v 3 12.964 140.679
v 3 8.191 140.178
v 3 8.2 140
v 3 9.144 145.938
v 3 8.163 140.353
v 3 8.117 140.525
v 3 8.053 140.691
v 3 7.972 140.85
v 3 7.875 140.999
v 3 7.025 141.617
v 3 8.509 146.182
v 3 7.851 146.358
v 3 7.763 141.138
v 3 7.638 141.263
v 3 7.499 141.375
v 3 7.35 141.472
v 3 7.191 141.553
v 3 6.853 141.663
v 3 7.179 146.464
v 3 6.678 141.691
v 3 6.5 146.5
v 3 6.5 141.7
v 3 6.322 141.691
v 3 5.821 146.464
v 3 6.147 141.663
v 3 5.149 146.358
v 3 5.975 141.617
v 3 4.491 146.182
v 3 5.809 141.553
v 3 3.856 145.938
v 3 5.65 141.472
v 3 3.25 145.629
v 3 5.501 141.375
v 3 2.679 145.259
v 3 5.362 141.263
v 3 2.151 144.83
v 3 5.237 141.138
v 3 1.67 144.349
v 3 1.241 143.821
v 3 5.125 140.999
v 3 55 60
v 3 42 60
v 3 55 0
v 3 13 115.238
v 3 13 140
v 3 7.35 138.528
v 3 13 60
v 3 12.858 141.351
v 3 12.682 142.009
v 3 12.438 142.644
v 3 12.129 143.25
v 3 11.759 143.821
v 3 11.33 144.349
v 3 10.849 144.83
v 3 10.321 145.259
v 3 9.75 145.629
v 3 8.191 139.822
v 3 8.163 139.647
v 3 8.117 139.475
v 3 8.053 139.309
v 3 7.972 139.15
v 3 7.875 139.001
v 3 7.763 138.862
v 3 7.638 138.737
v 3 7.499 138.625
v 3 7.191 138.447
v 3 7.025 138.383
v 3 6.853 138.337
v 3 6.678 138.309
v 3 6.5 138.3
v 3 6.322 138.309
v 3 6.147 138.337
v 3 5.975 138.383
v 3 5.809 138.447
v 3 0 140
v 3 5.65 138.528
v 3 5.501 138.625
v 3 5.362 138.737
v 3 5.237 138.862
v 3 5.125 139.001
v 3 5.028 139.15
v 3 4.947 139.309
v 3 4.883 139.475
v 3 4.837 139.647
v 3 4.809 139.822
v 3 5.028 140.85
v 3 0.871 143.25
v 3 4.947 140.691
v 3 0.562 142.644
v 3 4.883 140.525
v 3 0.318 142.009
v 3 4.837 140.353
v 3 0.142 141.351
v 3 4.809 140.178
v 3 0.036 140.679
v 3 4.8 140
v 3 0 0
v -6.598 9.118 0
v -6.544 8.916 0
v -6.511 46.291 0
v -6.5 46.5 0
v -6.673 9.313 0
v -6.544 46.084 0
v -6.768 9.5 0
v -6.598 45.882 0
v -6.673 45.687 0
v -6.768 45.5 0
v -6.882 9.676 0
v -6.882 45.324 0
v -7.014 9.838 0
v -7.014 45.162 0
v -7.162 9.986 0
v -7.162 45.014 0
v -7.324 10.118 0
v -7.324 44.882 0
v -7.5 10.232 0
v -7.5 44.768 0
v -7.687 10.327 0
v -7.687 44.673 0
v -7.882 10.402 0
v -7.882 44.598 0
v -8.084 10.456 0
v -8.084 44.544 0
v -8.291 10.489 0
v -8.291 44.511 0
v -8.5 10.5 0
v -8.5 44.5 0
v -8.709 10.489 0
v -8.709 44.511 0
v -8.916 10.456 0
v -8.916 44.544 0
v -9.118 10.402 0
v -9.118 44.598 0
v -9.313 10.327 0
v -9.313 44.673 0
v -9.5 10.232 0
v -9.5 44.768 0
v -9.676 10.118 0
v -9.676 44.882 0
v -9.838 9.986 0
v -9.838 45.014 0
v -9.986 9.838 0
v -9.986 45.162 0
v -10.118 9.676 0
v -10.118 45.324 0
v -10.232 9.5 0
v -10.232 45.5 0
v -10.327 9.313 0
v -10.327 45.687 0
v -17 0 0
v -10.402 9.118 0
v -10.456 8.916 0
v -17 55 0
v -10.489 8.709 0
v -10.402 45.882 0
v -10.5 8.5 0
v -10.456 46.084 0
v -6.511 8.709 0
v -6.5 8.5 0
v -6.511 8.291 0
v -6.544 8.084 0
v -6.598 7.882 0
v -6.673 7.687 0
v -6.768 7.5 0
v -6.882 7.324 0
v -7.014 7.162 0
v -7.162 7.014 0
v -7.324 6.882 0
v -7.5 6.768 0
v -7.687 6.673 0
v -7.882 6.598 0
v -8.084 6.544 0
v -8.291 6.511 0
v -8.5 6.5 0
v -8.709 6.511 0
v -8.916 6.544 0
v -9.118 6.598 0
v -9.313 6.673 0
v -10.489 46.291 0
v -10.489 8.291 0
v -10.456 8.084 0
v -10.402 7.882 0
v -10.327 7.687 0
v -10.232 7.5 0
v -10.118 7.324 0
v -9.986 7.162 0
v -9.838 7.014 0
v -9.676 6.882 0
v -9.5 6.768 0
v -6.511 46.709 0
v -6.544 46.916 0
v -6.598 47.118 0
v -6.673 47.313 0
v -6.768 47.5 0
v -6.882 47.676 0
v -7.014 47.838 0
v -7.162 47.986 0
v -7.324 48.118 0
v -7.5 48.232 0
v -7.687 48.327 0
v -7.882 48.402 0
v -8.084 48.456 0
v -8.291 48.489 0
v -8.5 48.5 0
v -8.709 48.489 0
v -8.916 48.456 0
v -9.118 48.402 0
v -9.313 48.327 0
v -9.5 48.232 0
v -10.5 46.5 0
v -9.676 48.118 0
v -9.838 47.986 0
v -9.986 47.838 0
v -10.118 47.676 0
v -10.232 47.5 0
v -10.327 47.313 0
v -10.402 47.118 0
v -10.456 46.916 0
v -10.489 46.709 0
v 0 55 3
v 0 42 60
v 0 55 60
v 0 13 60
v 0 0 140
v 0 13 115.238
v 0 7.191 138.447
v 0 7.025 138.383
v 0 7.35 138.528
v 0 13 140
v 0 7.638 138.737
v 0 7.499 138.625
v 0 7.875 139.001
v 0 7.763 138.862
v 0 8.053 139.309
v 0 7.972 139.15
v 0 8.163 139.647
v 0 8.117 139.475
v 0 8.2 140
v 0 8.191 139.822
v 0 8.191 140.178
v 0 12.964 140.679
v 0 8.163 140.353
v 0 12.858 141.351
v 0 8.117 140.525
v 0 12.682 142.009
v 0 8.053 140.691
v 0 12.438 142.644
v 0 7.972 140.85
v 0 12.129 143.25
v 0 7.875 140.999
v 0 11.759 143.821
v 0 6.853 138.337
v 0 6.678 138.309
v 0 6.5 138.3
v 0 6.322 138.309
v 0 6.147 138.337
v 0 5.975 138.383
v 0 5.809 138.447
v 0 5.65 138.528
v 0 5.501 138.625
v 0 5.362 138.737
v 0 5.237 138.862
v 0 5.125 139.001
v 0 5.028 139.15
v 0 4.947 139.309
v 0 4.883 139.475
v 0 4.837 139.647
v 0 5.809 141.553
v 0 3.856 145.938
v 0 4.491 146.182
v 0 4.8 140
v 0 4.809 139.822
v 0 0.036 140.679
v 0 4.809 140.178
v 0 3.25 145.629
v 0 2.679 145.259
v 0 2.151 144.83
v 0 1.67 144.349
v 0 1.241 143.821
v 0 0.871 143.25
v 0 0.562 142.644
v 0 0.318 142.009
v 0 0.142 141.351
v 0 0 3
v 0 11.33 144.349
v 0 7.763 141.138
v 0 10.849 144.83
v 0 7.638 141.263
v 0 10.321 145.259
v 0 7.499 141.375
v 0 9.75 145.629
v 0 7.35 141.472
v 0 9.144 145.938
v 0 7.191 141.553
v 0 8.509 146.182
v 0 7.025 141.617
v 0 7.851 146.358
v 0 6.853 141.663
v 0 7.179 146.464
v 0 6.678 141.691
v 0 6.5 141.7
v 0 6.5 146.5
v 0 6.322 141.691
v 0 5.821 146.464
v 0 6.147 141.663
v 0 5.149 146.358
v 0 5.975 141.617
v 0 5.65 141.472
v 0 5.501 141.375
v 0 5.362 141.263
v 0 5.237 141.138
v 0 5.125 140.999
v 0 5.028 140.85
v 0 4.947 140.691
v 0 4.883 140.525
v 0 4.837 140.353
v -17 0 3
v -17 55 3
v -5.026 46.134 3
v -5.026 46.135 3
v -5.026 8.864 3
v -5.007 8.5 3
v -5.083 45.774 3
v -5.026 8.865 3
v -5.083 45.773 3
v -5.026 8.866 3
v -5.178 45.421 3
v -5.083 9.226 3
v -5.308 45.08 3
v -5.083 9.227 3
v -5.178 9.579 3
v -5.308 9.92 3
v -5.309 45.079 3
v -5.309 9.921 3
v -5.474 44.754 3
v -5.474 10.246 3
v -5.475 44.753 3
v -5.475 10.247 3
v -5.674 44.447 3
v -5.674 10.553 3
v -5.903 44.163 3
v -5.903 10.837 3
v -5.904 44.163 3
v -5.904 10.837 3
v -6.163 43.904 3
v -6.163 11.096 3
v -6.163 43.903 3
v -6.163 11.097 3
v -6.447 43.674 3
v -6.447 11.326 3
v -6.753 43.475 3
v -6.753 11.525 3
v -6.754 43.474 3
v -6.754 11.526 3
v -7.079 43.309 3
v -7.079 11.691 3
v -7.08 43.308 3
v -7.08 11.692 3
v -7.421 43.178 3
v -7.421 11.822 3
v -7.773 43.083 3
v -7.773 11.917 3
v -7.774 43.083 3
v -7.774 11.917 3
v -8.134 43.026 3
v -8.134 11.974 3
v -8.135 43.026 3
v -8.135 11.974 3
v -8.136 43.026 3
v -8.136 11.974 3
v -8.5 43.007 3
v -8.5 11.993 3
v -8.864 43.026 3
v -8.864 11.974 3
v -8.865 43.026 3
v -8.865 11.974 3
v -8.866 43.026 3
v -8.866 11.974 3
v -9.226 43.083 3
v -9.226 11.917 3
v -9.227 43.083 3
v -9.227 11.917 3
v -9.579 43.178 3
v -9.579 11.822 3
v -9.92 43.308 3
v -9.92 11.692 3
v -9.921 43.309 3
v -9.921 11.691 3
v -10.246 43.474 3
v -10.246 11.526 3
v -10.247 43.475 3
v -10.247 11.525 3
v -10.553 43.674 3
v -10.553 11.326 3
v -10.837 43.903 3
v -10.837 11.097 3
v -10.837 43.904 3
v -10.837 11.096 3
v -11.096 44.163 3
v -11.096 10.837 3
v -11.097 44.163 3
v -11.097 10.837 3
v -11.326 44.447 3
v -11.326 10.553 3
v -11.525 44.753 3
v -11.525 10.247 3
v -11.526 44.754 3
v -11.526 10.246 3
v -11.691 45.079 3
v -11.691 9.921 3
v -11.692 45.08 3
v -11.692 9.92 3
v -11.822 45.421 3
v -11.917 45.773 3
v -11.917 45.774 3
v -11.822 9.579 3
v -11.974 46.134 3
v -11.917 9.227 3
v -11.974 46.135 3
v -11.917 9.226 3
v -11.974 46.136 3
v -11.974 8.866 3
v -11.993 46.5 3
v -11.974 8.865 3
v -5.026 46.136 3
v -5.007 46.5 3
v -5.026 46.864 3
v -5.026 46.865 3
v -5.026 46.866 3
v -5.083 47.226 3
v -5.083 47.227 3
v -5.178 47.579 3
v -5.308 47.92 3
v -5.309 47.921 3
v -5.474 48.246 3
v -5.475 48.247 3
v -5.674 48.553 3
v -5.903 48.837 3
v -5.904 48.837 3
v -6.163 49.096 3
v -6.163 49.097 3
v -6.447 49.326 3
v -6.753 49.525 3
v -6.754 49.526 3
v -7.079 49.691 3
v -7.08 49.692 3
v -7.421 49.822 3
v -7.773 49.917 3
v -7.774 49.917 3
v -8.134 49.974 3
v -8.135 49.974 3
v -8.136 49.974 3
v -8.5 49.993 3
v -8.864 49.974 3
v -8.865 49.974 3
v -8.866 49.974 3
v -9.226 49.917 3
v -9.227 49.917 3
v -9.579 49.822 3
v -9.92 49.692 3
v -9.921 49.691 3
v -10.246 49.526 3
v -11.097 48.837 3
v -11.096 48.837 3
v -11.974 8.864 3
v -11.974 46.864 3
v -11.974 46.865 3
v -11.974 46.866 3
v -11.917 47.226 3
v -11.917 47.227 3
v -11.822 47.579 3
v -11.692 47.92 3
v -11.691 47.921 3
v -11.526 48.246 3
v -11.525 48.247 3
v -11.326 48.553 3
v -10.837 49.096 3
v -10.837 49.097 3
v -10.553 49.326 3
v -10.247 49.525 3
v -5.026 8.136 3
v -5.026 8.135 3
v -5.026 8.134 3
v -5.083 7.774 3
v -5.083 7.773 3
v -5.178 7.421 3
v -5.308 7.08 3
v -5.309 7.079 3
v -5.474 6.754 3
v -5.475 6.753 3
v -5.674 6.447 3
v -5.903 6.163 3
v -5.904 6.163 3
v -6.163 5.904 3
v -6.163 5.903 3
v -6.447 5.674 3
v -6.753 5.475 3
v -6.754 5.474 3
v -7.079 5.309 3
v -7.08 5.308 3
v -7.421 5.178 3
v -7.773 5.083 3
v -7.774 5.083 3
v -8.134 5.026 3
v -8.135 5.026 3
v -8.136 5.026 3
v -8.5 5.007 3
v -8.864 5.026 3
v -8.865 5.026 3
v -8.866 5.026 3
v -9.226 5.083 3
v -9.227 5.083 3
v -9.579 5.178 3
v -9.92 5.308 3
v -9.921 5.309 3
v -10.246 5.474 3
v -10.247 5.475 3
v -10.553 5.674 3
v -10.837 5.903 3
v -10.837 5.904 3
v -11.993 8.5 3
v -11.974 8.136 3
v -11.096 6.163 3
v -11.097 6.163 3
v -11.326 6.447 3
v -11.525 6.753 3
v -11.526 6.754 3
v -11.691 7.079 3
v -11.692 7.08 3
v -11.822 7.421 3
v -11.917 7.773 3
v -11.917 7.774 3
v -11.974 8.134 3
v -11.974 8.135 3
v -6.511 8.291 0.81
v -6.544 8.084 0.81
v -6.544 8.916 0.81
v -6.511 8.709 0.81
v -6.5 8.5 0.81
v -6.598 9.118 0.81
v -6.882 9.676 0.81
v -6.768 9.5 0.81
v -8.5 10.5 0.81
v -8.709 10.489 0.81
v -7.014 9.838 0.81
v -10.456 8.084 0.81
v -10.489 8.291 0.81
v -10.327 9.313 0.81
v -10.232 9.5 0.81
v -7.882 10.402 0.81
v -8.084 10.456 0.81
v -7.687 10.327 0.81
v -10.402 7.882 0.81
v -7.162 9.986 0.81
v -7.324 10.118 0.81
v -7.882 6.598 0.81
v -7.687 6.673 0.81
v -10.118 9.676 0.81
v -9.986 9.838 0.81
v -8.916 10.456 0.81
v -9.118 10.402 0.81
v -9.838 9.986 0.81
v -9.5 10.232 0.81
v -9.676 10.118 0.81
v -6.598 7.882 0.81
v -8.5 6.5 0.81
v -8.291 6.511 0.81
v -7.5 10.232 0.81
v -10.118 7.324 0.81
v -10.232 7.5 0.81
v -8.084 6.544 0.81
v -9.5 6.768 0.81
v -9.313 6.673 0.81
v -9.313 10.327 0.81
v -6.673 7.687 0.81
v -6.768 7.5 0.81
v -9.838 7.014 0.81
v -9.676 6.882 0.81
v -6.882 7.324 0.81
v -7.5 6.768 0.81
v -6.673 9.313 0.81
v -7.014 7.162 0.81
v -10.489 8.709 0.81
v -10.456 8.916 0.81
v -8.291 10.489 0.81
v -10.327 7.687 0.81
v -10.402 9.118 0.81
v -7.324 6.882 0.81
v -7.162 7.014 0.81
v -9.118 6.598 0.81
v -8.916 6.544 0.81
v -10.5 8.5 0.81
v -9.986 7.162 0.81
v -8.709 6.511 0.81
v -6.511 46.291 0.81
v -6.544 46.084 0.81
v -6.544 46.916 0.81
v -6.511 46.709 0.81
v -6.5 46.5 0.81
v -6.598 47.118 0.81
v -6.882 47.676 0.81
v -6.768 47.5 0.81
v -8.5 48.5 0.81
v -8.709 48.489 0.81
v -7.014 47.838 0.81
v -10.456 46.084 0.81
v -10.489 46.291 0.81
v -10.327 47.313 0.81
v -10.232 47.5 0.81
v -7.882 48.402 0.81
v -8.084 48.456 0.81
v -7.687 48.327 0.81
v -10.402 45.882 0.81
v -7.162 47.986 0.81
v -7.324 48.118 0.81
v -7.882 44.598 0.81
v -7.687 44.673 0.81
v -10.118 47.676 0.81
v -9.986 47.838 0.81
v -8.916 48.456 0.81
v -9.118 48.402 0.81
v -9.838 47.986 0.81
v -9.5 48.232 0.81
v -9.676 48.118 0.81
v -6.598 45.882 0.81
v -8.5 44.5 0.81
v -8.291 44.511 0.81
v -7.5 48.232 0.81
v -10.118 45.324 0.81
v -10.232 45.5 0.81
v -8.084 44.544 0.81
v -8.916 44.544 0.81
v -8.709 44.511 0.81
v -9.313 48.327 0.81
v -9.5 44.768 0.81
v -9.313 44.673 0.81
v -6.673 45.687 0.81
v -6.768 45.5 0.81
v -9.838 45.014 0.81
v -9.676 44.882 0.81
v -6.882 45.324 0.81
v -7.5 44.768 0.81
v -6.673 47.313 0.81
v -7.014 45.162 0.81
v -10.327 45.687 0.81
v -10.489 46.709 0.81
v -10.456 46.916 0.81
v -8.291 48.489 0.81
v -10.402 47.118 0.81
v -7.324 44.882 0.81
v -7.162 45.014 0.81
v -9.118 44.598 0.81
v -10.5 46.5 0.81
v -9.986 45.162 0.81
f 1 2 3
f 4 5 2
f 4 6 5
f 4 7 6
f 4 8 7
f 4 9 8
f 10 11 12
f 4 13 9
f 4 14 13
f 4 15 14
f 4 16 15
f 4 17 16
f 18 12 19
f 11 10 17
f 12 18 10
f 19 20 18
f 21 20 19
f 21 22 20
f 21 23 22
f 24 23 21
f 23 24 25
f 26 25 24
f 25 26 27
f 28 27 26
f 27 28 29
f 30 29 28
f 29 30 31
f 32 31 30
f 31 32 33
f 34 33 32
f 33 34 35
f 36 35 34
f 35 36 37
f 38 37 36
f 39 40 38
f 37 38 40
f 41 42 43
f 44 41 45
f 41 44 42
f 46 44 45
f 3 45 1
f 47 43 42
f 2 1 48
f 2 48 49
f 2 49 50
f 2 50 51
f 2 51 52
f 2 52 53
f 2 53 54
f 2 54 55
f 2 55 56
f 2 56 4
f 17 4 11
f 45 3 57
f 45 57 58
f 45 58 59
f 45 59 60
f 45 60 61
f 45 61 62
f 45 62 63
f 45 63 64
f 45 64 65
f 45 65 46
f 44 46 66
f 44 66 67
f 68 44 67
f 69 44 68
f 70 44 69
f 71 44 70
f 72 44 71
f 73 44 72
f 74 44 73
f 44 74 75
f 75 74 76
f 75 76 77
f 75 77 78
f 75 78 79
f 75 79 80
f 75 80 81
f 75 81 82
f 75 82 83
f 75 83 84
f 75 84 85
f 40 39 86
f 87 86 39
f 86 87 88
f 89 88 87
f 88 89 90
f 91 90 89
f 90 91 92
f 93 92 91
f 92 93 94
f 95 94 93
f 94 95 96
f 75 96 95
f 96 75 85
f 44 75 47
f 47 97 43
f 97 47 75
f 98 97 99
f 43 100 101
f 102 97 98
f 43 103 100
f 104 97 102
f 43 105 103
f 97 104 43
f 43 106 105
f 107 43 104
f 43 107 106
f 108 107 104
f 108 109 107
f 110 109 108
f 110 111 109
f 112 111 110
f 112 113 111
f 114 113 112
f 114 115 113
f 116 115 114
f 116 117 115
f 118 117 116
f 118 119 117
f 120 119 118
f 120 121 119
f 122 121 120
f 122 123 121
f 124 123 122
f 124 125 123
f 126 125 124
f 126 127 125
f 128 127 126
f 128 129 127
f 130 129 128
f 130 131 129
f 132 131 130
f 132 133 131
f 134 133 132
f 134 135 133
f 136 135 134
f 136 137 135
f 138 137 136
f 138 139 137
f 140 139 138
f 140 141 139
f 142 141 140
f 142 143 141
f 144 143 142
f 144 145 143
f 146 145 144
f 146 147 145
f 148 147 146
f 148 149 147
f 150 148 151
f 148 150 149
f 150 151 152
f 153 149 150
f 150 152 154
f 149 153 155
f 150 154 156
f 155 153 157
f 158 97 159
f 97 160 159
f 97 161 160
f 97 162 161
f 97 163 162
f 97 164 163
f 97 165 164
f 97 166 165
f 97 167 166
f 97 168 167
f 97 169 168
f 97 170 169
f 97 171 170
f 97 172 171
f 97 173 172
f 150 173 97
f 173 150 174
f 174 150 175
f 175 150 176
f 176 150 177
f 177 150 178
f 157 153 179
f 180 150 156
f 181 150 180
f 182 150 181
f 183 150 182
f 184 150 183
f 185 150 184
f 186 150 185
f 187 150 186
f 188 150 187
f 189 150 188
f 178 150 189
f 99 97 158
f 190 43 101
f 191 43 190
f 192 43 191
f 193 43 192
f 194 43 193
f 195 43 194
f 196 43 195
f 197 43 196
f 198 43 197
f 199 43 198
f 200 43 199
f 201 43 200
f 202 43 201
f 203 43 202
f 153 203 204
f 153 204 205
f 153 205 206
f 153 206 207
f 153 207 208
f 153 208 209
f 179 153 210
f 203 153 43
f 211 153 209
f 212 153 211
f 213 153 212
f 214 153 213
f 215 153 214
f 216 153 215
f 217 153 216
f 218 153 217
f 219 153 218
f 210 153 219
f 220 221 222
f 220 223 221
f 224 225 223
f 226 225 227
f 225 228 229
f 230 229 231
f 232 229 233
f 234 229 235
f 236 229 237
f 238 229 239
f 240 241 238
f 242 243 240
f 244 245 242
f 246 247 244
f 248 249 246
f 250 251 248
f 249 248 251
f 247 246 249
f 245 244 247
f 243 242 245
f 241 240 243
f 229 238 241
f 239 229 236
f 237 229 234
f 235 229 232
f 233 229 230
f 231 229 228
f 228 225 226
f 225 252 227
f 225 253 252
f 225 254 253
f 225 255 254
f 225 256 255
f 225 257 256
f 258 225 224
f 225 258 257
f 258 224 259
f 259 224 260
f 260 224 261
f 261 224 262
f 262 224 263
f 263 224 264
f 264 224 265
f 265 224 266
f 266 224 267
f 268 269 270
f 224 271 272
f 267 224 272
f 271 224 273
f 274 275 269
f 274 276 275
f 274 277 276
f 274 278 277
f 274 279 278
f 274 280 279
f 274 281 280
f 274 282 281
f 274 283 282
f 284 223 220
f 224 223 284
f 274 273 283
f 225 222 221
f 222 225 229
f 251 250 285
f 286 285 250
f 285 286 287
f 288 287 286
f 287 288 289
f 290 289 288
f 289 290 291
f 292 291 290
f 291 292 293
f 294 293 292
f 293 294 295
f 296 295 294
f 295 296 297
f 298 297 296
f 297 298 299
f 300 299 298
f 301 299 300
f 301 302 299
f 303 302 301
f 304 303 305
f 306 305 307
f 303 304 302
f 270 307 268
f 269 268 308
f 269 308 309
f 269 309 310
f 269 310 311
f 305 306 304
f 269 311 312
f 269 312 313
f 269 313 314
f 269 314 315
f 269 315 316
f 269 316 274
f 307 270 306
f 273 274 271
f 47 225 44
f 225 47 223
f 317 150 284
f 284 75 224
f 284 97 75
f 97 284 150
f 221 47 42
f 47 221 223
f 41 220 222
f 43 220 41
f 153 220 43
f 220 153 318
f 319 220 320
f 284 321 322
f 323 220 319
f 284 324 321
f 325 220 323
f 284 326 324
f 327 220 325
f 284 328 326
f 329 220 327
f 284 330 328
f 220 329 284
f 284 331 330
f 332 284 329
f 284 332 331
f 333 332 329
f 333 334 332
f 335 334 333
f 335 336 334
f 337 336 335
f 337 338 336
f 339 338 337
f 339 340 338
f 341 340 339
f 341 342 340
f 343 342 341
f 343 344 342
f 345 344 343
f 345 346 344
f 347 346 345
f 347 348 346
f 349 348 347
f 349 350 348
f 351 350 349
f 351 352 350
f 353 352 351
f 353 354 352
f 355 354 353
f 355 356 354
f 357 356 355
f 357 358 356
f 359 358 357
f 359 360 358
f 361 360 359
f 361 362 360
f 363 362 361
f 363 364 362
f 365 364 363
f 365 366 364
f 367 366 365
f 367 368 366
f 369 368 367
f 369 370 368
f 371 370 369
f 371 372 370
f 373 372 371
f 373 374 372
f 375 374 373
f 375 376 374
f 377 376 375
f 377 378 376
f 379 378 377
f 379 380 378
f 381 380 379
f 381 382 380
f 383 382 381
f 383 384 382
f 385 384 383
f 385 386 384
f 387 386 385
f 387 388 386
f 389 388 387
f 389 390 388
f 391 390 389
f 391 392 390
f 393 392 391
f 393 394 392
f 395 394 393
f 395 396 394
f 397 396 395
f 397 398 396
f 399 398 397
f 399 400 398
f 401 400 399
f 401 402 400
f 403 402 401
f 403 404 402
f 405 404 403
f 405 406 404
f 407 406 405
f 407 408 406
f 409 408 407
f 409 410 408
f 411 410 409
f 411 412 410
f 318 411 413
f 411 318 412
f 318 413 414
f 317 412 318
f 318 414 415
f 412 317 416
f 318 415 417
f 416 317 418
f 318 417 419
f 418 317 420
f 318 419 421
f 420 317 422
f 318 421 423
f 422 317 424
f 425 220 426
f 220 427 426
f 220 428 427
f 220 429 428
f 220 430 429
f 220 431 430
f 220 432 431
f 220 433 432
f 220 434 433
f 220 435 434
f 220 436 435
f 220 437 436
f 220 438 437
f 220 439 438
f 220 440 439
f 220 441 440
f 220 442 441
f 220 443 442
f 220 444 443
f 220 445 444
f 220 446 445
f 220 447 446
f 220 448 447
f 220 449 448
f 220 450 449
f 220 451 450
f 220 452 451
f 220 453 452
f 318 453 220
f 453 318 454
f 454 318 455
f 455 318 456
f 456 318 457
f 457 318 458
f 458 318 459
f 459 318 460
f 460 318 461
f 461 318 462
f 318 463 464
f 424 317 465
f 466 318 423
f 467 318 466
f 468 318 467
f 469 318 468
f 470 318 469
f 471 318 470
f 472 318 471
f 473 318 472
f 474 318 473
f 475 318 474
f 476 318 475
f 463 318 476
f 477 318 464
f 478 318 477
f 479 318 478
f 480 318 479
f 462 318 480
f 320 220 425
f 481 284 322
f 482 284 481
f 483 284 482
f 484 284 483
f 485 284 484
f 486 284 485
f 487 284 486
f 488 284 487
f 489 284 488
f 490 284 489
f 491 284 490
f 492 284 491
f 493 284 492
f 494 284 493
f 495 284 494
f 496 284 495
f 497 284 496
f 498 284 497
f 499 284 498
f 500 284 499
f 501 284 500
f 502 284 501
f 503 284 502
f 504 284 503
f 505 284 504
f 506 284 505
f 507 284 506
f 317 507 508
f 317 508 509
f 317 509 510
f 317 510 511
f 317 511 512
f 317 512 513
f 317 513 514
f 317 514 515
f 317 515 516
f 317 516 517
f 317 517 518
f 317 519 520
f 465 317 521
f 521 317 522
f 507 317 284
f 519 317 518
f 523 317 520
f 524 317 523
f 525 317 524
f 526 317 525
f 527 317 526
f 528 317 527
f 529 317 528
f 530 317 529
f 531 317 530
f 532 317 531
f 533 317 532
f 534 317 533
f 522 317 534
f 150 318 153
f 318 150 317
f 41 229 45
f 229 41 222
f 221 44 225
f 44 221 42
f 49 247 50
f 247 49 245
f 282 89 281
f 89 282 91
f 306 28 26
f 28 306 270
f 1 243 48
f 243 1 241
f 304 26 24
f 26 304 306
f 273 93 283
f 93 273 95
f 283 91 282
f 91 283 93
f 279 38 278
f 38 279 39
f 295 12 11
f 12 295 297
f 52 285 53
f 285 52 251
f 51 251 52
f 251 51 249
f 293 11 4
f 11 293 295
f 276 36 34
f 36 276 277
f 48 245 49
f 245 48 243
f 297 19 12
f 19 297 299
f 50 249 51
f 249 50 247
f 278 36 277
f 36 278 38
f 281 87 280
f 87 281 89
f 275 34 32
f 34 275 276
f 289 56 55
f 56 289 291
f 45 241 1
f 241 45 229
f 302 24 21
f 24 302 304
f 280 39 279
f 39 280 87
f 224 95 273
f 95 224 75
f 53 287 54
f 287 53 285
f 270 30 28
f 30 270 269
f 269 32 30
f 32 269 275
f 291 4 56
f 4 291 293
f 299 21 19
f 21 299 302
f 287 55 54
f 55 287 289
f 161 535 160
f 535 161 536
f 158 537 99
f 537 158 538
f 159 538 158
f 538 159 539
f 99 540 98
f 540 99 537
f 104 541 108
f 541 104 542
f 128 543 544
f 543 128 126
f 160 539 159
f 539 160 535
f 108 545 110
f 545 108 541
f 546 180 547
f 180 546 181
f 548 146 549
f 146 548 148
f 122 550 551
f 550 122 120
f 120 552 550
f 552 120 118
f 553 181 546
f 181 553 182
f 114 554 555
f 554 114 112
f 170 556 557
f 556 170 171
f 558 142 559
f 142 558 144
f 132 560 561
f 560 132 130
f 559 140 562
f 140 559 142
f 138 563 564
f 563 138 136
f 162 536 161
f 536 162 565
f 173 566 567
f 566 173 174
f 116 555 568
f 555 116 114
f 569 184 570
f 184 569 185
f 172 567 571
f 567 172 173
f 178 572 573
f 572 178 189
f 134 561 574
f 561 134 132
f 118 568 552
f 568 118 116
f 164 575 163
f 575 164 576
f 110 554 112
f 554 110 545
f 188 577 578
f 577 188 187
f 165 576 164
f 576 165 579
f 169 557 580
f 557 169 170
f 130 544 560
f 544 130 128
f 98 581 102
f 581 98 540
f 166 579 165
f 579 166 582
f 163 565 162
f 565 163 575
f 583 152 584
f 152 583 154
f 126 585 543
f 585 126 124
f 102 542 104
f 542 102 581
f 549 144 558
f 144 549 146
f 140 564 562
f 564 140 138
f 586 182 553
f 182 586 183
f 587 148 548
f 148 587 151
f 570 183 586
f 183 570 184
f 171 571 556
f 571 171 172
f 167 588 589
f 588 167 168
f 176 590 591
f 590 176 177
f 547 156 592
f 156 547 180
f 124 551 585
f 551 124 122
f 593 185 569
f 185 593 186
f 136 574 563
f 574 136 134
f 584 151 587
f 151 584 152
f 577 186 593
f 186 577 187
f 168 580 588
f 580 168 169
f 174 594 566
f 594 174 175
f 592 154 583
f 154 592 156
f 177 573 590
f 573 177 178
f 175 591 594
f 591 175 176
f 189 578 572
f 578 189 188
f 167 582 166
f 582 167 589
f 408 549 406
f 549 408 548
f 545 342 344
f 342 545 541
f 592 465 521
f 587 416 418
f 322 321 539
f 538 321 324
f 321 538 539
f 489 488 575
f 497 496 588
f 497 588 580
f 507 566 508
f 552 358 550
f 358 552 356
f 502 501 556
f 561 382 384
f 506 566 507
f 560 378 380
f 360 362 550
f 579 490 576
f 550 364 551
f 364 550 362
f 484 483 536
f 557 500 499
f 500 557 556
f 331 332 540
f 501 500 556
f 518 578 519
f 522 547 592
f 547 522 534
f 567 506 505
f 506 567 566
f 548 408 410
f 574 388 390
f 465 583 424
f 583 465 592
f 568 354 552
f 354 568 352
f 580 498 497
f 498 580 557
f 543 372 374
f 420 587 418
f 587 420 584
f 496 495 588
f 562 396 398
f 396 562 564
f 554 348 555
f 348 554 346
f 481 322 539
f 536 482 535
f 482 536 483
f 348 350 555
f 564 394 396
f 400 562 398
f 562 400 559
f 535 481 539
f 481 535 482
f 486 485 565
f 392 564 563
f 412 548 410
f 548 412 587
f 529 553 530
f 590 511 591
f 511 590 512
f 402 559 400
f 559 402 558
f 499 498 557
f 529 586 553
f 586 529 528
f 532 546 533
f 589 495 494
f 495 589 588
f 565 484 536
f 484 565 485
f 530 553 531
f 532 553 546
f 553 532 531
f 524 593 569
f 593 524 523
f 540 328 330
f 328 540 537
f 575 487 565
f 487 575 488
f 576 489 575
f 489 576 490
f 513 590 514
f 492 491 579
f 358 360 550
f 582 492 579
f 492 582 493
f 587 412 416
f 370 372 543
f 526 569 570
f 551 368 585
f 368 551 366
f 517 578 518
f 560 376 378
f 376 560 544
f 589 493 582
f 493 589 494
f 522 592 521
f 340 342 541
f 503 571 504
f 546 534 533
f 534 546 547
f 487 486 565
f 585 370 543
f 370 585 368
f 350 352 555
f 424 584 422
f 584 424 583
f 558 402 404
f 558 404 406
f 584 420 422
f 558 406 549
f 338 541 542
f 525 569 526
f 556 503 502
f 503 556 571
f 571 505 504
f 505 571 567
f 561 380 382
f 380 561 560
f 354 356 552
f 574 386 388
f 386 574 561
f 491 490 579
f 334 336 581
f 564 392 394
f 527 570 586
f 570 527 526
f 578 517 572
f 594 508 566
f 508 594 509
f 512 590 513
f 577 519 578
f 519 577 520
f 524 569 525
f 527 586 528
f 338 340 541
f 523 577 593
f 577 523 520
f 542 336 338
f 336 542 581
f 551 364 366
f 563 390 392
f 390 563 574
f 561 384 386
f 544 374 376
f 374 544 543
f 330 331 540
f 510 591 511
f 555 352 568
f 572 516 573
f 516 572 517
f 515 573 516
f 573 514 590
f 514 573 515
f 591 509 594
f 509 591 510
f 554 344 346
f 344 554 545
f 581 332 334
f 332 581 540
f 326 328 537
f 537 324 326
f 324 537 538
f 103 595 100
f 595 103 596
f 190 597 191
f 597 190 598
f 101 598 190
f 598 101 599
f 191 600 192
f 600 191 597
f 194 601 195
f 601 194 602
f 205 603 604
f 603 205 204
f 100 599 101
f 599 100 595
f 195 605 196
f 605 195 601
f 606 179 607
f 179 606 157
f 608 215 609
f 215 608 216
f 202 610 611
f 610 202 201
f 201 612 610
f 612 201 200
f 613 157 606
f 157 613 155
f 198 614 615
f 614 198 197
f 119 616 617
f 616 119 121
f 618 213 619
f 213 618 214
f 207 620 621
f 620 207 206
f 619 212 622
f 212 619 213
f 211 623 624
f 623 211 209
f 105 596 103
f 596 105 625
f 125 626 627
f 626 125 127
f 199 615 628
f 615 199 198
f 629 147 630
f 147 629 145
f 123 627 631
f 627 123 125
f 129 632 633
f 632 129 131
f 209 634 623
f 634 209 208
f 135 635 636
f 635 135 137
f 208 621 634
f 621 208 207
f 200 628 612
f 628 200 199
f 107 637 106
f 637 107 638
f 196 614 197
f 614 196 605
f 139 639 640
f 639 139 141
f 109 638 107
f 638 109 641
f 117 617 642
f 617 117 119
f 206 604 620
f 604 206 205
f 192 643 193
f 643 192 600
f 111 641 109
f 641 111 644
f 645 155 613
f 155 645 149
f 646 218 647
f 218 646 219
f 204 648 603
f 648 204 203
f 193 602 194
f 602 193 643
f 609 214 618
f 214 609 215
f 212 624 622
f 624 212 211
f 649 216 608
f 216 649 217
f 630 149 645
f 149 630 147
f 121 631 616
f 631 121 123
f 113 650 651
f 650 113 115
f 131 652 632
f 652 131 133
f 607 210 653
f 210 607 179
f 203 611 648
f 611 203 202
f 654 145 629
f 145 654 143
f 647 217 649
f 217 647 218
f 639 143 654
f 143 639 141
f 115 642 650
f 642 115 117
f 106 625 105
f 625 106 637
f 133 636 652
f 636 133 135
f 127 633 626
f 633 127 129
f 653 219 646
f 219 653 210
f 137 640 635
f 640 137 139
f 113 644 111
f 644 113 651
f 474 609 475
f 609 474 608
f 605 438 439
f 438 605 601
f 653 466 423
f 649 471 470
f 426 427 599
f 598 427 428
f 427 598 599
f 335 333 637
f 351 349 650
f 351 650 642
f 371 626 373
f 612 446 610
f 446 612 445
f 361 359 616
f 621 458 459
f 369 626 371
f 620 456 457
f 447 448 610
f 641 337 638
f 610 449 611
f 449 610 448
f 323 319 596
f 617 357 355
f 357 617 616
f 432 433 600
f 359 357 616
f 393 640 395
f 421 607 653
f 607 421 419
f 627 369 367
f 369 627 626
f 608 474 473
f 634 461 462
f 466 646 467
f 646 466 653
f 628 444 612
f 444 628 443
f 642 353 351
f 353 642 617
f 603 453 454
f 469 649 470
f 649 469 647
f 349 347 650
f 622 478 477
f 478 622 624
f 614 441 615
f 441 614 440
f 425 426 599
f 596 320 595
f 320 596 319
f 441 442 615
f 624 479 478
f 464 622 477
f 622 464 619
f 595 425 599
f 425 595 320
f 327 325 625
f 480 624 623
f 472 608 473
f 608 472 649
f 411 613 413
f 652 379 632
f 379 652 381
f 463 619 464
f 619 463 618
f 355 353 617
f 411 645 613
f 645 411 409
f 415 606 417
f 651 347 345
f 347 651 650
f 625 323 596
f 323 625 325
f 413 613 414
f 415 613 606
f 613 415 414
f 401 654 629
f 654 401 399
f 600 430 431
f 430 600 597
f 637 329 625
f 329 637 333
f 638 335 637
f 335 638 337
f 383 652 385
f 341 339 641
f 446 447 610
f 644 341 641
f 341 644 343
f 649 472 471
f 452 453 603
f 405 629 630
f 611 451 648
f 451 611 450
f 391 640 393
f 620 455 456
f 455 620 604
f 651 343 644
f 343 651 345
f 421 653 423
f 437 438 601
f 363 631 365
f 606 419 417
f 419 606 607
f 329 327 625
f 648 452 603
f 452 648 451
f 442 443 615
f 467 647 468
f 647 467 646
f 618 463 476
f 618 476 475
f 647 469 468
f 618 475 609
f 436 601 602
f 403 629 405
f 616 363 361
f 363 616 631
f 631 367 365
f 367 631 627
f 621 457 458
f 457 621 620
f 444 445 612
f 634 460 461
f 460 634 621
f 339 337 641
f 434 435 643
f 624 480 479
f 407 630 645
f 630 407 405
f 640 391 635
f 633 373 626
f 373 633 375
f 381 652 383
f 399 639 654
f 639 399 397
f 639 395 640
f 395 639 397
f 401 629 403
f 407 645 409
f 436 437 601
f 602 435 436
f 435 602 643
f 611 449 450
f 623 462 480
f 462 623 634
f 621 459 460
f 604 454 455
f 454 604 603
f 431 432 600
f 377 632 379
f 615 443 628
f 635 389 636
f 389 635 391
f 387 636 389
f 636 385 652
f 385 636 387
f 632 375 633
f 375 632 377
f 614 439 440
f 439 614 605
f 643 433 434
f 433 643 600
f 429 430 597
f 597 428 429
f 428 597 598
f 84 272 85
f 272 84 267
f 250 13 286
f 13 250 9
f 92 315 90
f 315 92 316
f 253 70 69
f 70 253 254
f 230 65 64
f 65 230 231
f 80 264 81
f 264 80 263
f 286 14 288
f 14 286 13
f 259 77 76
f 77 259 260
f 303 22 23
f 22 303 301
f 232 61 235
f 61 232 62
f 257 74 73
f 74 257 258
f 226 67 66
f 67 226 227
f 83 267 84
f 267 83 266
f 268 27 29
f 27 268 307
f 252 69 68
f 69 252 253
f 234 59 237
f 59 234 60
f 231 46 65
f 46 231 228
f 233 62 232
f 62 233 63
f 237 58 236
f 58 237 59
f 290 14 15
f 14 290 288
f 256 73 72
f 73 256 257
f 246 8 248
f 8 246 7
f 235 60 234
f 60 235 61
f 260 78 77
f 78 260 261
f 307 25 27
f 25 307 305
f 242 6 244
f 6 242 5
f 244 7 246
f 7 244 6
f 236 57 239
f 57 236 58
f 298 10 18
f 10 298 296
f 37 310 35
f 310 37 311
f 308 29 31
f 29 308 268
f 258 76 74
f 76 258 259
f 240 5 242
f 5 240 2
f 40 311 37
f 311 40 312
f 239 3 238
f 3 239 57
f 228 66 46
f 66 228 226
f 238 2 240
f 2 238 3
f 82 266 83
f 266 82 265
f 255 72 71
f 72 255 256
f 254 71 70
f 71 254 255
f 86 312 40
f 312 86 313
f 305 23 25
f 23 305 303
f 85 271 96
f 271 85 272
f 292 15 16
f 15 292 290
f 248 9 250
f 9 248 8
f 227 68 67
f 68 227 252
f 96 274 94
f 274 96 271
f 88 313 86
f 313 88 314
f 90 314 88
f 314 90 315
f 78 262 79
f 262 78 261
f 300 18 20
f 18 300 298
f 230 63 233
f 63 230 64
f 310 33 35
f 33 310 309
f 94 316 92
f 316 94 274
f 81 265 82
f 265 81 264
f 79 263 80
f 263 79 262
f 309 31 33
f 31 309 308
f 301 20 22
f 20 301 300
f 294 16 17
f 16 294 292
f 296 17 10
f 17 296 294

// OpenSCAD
/**
 * Support
 * Model parameters
 */

SupportSimple1();

module SupportSimple1() {

    support_height = 140;
    support_width = 55;
    support_motor_support_height = 60;
    support_thickness = 3;
    bars_width = 13;
    horizontal_support_width = 20;
    support_throw_diameter = 3.4;
    horizontal_support_throw_diameter = 4;

    difference() {
        support(support_height, support_width, support_motor_support_height, support_thickness, bars_width, horizontal_support_width, fn=60);
        support_throws(support_height, support_throw_diameter);
        support_horizontal_throws(horizontal_support_width, horizontal_support_throw_diameter);
    }

    // has diff with support-motor-1.scad
    module support(support_height = 140, support_width = 54, support_motor_support_height = 60, support_thickness = 3, bars_width = 13, horizontal_support_width = 30, fn = 20) {

        union() {
            translate([0,0,0])
            cube([support_thickness, bars_width, support_height]);

            translate([0,0,0])
            cube([support_thickness, support_width, support_motor_support_height]);

            translate([-horizontal_support_width + support_thickness,0,0])
            cube([horizontal_support_width, support_width, support_thickness]);

            translate([0, 0, support_height])
            rotate([0,90,0])
            linear_extrude(height = support_thickness, center = false, convexity = 10, twist = 0)
            polygon([
                [0, 0],
                [0, bars_width],
                [support_height - support_motor_support_height, support_width],
                [support_height - support_motor_support_height, support_width - bars_width]
            ]);

            translate([0, bars_width / 2, support_height])
            rotate([0,90,0])
            cylinder(h=support_thickness, d=bars_width, center=false, $fn=fn);

        }

    }


    module support_throws(support_height = 140, support_throw_diameter = 3, fn = 60) {
        translate([0, bars_width / 2, support_height])
        rotate([0,90,0])
        cylinder(h=10, d=support_throw_diameter, center=true, $fn=fn);
    }


    // has diff with support-motor-1.scad
    module support_horizontal_throws(horizontal_support_width = 20, horizontal_support_throw_diameter = 4, support_thickness = 3, horizontal_support_thickness = 3, fn = 60) {

        epsilon = 0.01;
        horizontal_support_throw_radius = horizontal_support_throw_diameter / 2;

        cone_throw_heigh = horizontal_support_throw_radius * 1.1;
        cone_throw_r2 = horizontal_support_throw_radius * 1.75;

        union(){
            translate([ - ((horizontal_support_width - support_thickness) / 2) ,  (horizontal_support_width - support_thickness) / 2, 0]) {
                cylinder(h=10, d=horizontal_support_throw_diameter, center=true, $fn=fn);

                // cylinder(h = 2.2, r1 = 2, r2 = 3.5, center = true, $fn=fn); // Example
                translate([0,0, horizontal_support_thickness - cone_throw_heigh + epsilon])
                cylinder(h = cone_throw_heigh, r1 = horizontal_support_throw_radius, r2 = cone_throw_r2, center = false, $fn=fn);
            }

            translate([ -((horizontal_support_width - support_thickness) / 2), support_width - ((horizontal_support_width - support_thickness) / 2), 0]){
                cylinder(h=10, d=horizontal_support_throw_diameter, center=true, $fn=fn);

                translate([0,0, horizontal_support_thickness - cone_throw_heigh + epsilon])
                cylinder(h = cone_throw_heigh, r1 = horizontal_support_throw_radius, r2 = cone_throw_r2, center = false, $fn=fn);
            }
        }
    }

}
